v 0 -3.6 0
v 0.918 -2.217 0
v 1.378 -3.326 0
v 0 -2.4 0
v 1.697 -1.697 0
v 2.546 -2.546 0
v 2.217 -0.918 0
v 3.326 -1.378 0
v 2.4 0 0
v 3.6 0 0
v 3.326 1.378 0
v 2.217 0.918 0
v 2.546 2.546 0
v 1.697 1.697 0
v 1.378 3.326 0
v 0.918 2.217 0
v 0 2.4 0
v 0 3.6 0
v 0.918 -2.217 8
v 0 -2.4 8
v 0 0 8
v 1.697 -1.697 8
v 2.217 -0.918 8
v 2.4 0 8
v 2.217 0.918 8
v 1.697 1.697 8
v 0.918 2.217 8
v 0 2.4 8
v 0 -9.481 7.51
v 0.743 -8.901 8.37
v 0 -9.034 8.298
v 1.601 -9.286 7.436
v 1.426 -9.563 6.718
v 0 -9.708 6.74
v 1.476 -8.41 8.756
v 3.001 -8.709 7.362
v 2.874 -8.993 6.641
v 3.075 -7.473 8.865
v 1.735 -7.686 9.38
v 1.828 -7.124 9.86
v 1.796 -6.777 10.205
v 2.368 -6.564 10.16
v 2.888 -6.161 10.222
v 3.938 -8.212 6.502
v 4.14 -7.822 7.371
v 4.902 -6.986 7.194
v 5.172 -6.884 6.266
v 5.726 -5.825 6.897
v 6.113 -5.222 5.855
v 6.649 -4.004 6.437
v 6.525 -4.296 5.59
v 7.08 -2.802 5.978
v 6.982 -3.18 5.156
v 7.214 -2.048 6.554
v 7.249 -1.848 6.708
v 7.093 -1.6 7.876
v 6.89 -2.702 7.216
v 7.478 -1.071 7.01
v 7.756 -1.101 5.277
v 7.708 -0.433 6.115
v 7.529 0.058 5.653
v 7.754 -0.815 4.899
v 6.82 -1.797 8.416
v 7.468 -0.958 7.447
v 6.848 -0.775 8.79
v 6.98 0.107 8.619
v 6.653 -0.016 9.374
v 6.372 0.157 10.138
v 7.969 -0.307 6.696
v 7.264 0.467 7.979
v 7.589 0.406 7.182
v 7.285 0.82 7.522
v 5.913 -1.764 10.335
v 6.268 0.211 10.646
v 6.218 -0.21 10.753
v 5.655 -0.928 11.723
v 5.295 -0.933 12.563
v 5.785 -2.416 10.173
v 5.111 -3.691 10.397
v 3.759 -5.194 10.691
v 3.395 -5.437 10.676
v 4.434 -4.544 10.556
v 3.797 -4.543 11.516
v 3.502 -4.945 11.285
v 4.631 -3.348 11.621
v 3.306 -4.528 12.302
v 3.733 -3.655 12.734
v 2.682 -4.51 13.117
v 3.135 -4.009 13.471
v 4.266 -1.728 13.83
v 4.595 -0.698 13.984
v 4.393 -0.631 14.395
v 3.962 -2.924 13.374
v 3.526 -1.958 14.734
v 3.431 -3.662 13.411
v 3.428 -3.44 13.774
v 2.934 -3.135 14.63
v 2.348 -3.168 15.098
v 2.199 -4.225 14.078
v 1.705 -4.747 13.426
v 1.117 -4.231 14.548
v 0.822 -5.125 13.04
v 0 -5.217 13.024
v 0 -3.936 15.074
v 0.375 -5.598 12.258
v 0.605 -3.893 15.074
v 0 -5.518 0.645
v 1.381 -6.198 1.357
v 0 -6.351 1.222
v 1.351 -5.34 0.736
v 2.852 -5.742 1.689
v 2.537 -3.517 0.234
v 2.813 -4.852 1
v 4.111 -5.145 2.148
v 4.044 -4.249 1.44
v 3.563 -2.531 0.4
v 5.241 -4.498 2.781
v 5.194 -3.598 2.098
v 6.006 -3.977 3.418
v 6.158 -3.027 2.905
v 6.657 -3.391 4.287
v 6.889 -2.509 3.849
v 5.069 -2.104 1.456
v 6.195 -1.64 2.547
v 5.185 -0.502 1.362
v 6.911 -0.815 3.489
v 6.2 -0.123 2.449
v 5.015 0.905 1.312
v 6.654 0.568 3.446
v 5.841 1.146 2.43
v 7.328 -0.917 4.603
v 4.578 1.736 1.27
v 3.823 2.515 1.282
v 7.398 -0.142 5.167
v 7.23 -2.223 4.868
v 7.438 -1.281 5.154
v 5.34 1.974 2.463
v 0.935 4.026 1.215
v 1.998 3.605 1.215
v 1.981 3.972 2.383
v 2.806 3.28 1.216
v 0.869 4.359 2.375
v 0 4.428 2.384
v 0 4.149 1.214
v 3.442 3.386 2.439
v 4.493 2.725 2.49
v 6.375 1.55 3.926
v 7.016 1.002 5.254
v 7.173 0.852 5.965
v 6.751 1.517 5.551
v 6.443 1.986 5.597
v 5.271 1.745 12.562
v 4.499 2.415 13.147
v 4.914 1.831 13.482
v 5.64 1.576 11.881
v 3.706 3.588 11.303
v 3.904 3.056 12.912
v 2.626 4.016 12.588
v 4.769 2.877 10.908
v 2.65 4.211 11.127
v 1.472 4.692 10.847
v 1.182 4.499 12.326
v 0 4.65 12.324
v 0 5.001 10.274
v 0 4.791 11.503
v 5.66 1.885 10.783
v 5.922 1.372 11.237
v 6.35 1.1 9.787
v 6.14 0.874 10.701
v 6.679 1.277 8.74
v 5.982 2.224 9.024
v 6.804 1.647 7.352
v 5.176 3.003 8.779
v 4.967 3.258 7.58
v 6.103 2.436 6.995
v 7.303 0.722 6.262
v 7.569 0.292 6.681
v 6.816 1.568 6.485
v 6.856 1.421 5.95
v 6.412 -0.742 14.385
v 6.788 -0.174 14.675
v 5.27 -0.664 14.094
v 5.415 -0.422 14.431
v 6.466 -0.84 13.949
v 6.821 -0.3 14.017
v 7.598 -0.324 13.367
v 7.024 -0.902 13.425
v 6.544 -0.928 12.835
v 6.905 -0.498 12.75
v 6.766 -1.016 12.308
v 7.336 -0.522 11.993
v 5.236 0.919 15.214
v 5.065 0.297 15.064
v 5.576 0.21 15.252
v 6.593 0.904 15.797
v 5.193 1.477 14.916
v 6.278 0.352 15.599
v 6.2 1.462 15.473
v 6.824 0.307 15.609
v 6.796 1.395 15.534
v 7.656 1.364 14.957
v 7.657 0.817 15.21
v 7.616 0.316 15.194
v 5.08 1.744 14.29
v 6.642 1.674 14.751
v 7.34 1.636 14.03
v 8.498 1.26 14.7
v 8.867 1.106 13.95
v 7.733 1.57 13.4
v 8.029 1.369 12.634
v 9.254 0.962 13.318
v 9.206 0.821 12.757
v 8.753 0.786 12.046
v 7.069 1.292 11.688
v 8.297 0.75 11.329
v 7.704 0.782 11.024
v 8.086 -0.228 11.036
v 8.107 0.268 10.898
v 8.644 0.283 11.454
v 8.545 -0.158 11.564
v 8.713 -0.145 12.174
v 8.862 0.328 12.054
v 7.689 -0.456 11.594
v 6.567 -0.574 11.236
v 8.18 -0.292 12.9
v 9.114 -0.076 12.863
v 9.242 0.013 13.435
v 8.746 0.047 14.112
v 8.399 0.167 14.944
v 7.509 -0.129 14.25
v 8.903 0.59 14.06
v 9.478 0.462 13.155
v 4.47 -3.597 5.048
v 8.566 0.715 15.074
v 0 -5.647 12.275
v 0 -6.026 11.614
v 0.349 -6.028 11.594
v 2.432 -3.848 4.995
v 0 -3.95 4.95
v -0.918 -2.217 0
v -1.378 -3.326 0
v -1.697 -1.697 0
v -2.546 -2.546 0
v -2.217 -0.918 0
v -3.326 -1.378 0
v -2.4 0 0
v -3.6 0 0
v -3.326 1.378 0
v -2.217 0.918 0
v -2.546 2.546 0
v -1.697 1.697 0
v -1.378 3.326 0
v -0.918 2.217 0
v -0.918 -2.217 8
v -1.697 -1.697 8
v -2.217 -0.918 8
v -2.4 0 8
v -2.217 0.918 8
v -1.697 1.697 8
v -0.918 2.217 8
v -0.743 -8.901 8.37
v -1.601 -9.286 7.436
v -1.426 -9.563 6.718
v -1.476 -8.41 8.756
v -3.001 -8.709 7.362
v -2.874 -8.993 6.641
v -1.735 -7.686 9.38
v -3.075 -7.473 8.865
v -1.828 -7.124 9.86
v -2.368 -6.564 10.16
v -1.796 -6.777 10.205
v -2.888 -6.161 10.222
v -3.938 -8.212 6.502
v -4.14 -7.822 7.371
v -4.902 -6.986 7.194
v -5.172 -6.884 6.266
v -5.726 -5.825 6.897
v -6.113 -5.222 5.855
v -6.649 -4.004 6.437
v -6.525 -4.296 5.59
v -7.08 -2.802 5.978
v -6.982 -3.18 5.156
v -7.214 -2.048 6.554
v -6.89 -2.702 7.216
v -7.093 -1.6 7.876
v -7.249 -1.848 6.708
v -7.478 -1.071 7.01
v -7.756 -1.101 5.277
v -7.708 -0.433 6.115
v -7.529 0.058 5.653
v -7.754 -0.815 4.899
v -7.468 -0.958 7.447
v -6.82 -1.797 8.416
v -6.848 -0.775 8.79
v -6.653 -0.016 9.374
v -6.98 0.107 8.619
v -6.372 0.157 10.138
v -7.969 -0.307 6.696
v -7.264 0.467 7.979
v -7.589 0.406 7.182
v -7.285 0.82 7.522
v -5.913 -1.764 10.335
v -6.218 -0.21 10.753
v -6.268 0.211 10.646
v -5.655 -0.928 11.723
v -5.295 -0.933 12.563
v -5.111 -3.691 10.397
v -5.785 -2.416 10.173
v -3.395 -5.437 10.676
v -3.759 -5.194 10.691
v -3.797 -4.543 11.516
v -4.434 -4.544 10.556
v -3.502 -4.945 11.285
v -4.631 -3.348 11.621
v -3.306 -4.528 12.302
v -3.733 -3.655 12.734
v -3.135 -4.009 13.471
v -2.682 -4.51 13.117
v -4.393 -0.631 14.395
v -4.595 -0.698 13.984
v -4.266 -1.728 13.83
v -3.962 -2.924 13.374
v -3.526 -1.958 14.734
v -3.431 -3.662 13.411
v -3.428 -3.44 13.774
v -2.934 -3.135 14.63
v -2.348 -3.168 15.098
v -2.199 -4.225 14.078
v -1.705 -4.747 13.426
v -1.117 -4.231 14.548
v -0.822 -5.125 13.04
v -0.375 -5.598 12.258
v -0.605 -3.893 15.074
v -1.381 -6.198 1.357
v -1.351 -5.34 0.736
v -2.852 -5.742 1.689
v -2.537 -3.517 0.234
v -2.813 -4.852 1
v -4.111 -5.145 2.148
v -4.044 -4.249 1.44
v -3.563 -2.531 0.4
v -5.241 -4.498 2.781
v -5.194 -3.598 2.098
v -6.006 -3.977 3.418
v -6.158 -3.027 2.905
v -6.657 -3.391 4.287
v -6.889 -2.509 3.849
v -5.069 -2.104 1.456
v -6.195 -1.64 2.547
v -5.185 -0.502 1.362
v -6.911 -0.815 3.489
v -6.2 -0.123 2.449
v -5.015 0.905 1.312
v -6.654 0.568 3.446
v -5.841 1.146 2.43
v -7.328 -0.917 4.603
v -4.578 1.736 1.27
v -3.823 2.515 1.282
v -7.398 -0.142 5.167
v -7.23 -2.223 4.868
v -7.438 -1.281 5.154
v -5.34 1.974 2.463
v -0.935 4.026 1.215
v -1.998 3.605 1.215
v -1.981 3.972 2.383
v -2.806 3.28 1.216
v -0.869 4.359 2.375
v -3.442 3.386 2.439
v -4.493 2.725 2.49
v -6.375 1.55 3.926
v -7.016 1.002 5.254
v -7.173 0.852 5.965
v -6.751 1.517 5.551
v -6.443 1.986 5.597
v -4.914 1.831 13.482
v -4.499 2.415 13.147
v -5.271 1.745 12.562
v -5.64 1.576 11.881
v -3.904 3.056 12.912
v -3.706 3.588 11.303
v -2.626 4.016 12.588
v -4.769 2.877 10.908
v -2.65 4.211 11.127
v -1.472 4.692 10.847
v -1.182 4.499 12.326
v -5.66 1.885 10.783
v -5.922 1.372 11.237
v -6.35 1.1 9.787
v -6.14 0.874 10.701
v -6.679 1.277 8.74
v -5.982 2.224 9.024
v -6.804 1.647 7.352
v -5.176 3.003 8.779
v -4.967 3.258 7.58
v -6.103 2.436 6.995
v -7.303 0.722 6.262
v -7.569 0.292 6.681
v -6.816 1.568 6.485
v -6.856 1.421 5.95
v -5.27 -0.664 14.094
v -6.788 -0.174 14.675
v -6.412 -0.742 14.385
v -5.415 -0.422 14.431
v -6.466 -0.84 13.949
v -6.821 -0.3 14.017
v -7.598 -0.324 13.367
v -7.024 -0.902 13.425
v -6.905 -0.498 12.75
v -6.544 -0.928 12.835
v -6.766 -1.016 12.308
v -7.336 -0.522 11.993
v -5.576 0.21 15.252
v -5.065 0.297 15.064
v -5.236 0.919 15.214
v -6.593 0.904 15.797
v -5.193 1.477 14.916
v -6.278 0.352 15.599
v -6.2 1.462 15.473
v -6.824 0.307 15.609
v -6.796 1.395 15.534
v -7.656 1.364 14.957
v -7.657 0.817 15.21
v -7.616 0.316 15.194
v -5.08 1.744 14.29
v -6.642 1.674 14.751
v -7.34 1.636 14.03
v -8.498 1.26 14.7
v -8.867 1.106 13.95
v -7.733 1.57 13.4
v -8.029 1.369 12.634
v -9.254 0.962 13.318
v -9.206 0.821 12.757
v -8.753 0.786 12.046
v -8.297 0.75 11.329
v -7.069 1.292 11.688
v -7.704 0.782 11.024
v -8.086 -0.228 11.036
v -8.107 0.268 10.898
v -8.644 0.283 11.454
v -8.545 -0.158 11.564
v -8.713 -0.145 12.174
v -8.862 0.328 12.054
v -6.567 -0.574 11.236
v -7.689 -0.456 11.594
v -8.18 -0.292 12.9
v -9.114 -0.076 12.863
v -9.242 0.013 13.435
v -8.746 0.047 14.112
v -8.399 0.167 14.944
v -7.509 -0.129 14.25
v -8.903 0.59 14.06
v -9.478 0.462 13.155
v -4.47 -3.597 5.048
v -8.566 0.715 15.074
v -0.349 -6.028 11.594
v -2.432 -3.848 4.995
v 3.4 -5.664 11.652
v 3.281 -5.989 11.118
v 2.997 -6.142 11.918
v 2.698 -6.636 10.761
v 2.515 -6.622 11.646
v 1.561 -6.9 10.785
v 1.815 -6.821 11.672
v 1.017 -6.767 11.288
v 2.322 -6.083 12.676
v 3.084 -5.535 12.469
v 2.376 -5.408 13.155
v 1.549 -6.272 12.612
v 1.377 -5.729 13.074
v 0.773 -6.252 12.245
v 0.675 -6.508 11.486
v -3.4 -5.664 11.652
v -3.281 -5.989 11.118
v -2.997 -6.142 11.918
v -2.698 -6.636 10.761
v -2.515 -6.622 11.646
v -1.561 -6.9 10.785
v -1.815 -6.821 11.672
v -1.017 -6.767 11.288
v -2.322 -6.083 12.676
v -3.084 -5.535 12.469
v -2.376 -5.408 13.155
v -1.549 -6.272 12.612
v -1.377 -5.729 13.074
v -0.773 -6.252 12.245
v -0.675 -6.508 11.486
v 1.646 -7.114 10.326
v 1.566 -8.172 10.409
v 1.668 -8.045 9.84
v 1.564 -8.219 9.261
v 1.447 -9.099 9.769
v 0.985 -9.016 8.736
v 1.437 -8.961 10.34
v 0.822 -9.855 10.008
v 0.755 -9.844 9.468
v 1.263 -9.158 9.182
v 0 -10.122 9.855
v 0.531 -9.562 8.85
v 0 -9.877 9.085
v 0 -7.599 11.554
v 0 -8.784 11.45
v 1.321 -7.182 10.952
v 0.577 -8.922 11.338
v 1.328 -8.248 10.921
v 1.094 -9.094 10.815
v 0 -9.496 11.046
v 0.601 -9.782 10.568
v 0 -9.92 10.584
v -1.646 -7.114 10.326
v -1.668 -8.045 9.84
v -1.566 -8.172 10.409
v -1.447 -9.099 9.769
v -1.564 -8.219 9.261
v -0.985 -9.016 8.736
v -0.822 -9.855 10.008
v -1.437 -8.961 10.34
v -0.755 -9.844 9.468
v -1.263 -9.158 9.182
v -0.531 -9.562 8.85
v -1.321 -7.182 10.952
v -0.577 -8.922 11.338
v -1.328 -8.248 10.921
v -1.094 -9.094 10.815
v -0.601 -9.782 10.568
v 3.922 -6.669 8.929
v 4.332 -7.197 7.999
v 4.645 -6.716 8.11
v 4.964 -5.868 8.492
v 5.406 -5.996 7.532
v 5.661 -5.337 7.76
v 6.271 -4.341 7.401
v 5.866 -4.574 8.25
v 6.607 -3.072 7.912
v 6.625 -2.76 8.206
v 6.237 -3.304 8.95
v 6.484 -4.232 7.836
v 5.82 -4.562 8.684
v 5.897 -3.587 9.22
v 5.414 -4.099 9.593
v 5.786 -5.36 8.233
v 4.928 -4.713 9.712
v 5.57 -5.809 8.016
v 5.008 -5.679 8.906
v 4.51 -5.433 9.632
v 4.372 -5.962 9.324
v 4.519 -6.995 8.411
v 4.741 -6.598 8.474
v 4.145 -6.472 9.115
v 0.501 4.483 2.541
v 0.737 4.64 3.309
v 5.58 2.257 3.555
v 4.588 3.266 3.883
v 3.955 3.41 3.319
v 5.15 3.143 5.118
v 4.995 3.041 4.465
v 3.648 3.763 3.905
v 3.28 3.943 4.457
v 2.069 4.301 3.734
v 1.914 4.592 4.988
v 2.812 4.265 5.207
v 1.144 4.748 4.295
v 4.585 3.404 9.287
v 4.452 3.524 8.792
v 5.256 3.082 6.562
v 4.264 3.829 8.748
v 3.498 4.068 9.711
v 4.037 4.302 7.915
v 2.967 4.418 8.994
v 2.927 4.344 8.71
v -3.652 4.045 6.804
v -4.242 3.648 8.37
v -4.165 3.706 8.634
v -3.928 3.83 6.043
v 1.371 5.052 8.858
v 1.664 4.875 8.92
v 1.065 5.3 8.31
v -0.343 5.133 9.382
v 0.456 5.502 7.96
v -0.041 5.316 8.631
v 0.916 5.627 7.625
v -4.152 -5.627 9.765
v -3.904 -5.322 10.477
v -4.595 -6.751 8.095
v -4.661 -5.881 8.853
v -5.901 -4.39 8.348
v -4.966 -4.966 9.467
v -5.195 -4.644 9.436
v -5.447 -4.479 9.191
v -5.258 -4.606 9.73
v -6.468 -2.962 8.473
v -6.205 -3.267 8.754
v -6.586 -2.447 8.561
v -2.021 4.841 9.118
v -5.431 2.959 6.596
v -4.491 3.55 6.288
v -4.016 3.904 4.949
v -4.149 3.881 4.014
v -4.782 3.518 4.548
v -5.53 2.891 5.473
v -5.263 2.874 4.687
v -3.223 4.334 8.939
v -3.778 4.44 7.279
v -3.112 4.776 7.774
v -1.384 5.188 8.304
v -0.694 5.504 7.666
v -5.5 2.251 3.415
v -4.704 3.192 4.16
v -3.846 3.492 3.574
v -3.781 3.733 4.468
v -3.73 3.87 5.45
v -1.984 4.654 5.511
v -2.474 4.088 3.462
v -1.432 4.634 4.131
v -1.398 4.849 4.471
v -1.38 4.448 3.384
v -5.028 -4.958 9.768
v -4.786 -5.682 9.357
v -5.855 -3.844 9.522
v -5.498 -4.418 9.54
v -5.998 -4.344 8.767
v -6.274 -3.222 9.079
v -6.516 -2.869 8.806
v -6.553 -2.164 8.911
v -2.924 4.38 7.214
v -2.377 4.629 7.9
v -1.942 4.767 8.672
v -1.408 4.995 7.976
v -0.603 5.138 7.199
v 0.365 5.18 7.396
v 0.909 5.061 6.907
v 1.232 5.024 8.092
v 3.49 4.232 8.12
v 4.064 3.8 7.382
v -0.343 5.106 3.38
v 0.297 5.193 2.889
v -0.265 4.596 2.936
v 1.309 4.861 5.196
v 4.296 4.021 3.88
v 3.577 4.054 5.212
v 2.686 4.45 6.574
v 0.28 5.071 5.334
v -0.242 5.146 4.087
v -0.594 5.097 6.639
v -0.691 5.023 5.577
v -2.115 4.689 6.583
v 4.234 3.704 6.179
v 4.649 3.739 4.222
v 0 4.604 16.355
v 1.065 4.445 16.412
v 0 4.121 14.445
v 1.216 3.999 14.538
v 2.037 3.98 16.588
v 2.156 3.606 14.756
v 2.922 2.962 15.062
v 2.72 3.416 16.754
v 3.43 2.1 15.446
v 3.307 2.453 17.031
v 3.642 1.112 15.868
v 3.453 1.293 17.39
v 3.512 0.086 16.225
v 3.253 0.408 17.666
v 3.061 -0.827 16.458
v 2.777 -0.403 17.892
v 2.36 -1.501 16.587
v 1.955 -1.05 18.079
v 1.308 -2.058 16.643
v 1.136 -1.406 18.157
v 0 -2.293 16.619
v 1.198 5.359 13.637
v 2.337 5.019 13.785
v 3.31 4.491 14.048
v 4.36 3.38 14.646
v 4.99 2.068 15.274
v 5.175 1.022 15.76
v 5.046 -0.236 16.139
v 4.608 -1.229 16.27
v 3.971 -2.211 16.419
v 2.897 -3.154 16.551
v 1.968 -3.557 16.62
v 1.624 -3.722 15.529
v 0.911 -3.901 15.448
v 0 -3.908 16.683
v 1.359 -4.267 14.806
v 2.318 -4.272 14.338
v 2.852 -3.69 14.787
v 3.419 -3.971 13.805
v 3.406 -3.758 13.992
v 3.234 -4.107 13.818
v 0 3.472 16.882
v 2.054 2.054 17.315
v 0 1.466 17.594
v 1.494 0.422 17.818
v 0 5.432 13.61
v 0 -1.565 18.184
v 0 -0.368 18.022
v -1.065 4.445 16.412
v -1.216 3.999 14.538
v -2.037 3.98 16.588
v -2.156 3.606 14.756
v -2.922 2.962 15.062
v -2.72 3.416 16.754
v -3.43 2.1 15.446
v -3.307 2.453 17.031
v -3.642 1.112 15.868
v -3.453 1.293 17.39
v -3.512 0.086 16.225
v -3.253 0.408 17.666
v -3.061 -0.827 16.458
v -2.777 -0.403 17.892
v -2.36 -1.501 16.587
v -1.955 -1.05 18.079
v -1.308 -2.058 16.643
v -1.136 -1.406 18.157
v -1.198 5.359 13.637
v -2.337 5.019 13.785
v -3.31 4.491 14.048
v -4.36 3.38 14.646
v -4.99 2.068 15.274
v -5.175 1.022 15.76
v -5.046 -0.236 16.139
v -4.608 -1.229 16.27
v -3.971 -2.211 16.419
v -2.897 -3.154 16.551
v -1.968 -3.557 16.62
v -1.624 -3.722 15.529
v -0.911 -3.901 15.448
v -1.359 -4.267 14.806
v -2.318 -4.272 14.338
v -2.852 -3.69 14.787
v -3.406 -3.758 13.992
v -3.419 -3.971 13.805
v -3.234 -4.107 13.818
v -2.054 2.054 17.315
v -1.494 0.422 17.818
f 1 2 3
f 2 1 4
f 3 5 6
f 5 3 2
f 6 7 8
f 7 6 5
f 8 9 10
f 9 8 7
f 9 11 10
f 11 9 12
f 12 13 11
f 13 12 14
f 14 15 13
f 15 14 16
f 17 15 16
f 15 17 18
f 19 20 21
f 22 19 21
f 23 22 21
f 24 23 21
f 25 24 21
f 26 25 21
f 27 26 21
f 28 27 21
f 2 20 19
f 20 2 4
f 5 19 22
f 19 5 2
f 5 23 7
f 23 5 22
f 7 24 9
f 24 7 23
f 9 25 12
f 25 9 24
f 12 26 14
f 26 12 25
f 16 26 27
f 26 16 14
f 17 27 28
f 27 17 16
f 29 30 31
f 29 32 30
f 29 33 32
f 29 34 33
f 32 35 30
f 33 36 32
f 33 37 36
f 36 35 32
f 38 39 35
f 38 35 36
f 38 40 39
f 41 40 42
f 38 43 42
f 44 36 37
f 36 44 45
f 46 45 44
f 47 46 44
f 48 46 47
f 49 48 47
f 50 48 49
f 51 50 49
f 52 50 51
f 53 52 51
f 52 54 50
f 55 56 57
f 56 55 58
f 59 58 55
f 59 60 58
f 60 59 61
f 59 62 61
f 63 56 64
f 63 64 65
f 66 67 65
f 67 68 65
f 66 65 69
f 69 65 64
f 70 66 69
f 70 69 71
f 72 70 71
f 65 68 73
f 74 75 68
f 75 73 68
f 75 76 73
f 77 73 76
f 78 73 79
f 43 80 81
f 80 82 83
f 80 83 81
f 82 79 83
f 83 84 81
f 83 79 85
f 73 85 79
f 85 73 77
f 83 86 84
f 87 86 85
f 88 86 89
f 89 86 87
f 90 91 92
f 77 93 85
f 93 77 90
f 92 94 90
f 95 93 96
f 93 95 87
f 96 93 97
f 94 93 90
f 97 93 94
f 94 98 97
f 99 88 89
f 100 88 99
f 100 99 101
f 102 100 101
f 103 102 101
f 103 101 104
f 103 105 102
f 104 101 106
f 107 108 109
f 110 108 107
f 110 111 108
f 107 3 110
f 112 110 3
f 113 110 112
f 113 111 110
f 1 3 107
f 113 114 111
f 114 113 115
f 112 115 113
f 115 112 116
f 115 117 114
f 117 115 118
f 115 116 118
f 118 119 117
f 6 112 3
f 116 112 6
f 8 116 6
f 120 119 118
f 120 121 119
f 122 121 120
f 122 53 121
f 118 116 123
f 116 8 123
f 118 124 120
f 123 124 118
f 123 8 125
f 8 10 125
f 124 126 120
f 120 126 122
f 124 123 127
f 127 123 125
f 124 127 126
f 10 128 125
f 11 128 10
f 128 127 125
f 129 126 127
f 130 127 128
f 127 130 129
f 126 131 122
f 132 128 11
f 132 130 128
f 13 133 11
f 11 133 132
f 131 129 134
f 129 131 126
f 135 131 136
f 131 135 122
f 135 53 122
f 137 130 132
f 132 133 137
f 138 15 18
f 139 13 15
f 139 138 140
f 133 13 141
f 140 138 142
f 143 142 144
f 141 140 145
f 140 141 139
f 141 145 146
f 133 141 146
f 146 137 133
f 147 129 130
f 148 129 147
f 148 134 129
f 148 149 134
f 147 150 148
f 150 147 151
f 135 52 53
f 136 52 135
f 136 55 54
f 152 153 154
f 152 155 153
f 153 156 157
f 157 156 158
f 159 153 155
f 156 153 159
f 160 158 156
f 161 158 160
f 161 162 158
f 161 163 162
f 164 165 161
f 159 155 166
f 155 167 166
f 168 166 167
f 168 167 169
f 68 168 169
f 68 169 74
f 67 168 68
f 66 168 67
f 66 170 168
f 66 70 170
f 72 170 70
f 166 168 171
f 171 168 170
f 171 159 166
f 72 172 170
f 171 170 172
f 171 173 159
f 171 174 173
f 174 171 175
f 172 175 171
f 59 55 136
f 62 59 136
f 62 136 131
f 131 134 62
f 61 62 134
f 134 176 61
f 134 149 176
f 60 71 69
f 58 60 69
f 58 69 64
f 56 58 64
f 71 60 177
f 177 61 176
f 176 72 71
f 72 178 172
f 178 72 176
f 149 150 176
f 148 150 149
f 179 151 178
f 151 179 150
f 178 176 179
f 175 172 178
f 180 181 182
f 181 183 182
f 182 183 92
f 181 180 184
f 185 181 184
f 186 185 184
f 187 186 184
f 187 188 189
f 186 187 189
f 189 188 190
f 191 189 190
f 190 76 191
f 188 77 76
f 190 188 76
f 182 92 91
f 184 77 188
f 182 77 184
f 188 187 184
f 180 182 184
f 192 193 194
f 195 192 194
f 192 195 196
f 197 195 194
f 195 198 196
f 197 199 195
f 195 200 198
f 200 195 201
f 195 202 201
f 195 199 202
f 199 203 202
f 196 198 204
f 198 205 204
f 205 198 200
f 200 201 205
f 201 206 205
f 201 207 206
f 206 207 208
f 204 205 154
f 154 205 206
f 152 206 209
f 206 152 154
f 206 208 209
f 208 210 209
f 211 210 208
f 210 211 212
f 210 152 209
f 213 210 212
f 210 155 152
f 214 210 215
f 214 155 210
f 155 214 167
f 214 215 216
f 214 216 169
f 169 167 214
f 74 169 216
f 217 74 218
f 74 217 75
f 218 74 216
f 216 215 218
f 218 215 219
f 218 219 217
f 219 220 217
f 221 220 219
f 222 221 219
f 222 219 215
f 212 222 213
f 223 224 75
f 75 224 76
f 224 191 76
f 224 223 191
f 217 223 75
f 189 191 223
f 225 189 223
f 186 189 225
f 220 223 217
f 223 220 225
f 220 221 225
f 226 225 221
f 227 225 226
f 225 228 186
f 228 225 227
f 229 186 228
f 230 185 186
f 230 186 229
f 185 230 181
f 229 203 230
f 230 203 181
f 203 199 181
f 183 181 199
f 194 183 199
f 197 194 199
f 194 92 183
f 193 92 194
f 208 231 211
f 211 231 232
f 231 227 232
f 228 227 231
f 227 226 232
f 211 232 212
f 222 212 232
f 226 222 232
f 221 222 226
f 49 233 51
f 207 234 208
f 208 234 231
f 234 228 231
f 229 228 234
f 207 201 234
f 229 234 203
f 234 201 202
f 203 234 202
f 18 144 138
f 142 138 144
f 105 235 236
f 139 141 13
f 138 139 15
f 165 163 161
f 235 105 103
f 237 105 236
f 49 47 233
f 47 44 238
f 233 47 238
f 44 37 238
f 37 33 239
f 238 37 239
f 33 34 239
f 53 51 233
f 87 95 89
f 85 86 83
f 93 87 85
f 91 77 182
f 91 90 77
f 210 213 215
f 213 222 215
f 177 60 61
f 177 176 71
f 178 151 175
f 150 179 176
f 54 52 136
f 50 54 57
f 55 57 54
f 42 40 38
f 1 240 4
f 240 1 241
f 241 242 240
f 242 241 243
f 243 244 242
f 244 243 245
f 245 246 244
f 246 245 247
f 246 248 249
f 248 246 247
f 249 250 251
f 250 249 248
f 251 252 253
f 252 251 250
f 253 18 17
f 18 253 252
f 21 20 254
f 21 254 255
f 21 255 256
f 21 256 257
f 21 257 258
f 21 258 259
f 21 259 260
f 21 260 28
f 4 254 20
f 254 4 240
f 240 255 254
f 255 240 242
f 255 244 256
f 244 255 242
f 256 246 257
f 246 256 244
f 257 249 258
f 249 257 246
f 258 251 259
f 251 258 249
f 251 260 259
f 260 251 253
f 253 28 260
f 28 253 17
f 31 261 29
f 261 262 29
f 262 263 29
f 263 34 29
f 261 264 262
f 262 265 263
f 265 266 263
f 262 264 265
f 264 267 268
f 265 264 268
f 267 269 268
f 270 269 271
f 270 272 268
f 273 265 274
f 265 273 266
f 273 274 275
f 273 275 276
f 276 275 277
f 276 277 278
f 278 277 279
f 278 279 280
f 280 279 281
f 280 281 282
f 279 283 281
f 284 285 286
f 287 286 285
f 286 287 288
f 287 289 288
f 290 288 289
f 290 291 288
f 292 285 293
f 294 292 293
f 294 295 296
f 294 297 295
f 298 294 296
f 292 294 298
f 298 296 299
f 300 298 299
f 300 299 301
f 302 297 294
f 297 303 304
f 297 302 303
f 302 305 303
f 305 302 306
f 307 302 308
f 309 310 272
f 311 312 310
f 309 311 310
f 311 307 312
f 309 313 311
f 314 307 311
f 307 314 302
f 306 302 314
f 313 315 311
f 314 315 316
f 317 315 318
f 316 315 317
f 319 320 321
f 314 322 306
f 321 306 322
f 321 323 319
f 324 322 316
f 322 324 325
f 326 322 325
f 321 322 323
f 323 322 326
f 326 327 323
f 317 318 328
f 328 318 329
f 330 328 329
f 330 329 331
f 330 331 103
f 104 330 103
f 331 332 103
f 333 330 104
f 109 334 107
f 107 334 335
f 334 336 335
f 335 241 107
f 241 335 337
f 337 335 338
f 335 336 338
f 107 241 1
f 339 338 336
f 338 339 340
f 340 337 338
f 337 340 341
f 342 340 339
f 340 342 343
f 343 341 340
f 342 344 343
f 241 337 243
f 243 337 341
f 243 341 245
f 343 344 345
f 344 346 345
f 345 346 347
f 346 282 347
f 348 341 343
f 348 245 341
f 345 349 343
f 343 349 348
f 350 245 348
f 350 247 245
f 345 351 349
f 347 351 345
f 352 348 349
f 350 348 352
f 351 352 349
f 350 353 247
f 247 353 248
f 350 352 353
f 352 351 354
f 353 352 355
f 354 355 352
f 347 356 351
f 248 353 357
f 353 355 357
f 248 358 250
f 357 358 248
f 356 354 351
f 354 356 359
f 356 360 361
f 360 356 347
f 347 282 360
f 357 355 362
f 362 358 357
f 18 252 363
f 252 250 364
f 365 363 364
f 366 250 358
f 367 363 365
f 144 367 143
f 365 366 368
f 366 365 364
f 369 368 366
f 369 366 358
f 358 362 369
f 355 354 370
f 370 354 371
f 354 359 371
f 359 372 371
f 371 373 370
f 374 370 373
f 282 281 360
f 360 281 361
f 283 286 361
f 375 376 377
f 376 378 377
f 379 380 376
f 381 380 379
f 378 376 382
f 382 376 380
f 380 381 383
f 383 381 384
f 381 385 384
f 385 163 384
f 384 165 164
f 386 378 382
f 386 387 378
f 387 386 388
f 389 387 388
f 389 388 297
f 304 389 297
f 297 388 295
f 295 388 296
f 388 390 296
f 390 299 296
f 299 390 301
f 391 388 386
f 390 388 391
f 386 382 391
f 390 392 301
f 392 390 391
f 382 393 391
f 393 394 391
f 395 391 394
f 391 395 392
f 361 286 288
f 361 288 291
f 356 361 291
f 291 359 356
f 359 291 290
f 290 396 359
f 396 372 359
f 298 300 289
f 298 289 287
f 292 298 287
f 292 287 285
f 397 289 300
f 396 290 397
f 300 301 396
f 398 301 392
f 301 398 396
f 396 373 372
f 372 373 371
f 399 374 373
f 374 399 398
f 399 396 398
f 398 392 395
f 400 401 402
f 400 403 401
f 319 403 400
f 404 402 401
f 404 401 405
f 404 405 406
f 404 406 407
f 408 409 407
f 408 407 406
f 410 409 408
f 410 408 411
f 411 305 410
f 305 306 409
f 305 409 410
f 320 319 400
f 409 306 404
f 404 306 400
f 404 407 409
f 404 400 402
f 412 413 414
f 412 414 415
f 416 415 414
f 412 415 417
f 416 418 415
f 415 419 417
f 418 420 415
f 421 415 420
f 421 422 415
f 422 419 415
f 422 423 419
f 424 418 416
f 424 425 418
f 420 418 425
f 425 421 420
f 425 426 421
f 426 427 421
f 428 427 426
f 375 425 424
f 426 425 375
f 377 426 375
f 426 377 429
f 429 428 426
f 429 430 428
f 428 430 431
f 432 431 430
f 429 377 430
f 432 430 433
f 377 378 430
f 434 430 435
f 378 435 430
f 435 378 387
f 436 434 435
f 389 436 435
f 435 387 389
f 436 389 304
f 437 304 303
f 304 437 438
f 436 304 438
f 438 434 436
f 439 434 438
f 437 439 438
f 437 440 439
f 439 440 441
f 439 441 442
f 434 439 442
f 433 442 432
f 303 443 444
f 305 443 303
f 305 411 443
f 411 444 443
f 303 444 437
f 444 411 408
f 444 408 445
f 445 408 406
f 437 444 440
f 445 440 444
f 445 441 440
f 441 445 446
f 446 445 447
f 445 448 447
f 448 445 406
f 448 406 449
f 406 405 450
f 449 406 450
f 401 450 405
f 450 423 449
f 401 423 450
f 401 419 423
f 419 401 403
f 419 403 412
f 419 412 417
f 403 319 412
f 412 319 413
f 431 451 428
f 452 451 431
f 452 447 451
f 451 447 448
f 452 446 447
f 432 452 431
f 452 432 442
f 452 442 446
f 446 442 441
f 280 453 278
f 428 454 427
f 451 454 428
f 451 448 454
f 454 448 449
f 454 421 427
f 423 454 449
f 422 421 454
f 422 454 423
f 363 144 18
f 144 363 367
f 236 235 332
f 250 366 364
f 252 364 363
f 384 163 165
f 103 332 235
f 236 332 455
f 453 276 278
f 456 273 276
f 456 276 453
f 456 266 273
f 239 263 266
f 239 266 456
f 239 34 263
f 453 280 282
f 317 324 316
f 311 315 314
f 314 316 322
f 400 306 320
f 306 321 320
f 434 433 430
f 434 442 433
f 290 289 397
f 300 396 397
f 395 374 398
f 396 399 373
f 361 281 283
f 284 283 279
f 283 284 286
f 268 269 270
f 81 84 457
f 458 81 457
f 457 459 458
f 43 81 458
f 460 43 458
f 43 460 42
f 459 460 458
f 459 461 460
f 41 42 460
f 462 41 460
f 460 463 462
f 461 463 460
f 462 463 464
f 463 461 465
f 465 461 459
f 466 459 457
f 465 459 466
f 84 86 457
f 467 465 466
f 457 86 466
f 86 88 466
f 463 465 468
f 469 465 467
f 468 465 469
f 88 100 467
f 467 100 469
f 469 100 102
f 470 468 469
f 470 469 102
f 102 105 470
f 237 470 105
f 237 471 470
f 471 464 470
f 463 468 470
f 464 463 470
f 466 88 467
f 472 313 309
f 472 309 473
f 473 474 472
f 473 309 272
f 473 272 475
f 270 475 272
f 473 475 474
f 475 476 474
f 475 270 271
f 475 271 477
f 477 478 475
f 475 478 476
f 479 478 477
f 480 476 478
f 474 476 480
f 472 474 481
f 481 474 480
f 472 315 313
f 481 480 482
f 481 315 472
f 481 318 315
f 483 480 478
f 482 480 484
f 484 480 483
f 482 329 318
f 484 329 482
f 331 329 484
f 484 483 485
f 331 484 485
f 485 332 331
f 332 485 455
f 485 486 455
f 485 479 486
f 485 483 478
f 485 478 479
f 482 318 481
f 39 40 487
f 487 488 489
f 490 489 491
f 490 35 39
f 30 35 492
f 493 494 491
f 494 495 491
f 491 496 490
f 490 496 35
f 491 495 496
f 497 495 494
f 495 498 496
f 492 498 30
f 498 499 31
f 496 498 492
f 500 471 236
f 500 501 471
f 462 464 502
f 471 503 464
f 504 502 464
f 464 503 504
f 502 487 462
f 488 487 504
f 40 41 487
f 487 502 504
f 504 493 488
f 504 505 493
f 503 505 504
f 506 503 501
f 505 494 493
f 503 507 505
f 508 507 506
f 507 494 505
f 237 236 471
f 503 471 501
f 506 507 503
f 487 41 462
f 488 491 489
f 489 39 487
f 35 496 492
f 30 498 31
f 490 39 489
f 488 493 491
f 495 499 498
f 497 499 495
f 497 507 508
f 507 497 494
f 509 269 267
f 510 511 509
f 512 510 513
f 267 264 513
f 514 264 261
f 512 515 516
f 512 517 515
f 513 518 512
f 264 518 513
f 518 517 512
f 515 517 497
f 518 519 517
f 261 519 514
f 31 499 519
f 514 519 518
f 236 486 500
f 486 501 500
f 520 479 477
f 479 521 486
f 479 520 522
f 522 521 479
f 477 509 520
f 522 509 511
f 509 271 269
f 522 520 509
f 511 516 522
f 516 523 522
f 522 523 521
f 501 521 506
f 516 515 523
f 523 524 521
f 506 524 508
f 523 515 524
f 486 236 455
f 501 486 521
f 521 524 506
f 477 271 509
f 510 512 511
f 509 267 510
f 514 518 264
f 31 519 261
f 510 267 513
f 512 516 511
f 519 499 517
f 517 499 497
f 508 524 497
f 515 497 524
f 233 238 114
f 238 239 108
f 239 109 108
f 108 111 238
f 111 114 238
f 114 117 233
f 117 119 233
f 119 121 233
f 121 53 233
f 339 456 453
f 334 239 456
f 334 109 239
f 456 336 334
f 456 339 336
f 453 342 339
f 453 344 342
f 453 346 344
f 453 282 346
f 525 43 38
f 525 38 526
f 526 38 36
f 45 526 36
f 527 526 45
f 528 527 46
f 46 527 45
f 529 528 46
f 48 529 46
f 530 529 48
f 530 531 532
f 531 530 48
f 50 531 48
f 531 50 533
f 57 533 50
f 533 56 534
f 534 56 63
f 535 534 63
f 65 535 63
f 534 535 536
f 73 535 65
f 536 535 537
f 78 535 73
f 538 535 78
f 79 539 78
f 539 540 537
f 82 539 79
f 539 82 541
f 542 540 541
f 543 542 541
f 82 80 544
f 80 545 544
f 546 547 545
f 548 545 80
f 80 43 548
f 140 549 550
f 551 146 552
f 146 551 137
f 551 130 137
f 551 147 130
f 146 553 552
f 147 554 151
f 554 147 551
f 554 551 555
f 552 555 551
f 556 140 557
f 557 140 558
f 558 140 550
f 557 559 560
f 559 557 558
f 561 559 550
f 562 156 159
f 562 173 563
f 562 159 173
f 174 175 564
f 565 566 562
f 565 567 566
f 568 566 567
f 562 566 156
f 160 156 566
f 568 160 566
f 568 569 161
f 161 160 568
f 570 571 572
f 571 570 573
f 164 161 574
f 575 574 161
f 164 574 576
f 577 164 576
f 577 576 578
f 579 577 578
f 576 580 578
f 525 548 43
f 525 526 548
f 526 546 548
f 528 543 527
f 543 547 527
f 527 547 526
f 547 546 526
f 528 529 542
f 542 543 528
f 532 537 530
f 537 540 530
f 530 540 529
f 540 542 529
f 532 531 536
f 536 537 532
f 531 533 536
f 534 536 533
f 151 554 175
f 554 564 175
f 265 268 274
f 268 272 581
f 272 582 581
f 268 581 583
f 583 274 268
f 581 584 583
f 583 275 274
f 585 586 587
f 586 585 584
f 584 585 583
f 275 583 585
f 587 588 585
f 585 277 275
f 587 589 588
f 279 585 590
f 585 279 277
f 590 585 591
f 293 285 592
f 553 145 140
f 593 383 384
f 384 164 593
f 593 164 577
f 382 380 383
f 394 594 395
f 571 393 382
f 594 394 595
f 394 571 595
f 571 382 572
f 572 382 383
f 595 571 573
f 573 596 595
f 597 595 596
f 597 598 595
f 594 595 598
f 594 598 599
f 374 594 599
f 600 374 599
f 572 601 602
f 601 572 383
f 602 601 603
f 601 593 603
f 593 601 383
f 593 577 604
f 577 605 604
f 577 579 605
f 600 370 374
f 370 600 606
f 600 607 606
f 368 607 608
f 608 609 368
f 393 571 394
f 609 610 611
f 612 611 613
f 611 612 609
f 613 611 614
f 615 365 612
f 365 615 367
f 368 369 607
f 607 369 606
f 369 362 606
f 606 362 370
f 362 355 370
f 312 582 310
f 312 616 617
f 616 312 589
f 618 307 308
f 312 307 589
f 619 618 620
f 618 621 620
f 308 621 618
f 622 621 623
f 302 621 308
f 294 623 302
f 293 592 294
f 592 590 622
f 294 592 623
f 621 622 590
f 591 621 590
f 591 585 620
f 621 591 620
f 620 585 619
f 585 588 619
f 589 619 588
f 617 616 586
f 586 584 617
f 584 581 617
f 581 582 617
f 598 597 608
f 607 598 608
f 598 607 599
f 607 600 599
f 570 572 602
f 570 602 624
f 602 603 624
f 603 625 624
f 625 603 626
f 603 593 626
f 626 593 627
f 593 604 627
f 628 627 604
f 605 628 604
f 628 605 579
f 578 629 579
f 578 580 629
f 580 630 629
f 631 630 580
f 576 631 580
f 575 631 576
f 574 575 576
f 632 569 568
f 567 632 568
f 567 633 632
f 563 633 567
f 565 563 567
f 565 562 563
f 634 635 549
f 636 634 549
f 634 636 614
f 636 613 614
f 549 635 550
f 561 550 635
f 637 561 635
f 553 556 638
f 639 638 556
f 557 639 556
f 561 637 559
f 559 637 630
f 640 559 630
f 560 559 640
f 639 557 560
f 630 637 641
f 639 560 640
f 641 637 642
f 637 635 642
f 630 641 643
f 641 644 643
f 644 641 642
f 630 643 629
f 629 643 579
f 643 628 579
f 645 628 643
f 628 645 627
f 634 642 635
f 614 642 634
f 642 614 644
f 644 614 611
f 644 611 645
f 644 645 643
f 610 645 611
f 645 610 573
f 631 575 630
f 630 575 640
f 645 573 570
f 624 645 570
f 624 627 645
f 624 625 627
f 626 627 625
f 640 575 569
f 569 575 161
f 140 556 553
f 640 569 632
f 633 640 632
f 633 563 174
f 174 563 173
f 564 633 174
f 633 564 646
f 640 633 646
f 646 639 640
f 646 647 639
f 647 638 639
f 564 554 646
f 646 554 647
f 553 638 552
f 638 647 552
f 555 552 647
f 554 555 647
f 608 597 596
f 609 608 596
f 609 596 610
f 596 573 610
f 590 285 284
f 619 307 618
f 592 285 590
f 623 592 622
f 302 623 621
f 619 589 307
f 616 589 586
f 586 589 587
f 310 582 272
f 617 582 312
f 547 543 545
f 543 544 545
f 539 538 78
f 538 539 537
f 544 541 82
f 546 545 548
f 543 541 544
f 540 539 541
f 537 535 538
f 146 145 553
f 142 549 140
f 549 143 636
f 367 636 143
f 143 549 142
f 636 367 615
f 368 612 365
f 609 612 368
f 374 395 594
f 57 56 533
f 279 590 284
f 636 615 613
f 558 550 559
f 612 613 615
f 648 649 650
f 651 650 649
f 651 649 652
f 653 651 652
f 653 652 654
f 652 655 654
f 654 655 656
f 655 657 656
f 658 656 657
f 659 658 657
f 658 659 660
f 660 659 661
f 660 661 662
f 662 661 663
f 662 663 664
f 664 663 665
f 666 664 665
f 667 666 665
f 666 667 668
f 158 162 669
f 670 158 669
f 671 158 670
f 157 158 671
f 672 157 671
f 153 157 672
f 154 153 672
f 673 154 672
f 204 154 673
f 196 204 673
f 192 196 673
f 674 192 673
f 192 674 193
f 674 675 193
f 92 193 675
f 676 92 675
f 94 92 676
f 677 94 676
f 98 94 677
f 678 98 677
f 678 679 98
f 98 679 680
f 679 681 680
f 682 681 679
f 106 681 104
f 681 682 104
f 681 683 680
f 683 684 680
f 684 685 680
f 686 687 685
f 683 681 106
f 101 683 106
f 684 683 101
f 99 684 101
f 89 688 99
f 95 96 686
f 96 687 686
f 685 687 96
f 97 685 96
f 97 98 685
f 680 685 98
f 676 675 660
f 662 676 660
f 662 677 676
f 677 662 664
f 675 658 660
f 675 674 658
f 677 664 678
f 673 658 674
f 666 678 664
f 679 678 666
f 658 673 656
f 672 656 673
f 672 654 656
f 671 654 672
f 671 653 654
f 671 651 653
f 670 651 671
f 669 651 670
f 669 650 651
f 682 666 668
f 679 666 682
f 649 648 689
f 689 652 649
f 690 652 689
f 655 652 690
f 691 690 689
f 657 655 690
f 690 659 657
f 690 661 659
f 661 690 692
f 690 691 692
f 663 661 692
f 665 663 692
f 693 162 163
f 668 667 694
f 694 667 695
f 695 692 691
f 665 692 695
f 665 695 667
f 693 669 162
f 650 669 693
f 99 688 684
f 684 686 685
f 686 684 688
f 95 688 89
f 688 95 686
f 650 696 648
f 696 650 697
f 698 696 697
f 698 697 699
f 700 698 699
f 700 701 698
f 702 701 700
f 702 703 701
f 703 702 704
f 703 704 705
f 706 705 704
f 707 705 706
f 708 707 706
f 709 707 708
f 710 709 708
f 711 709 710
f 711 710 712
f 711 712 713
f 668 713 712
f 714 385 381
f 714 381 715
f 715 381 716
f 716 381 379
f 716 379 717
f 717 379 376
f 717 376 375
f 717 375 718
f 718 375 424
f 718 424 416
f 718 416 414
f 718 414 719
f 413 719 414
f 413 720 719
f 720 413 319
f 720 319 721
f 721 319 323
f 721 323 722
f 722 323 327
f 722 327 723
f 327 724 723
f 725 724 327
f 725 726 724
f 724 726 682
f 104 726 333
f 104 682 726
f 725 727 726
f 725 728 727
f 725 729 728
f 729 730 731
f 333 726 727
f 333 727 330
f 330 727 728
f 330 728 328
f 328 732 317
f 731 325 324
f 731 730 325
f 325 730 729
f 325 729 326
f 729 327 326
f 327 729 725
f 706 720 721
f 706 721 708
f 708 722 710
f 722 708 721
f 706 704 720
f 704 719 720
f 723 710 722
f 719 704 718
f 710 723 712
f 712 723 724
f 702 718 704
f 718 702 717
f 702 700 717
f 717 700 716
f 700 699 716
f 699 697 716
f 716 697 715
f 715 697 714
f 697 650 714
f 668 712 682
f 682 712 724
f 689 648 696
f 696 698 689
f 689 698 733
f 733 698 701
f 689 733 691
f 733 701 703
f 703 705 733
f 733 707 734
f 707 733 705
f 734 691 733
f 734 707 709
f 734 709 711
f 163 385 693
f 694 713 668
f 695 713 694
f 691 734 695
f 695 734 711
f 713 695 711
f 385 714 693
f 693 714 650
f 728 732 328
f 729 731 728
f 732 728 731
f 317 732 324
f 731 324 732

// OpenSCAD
use <../lib.scad>
use <s/89646s01.scad>
use <s/89646s02.scad>
use <s/89646s03.scad>
use <s/89646s04.scad>
use <s/89646s05.scad>
use <s/89646s06.scad>
function ldraw_lib__89646() = [
// 0 Minifig Head Muppet Bear
// 0 Name: 89646.dat
// 0 Author: Fredrik Hareide [fhareide]
// 0 !LDRAW_ORG Part UPDATE 2024-08
// 0 !LICENSE Licensed under CC BY 4.0 : see CAreadme.txt
// 
// 0 BFC CERTIFY CCW
  [0,"BFC","CERTIFY"],
  [0,"BFC","CCW"],
// 
// 0 !HISTORY 2024-01-12 {LEGO Instructions App} Original part shape
// 0 !HISTORY 2024-01-12 [fhareide] File preparation for LDraw Parts Tracker
// 0 !HISTORY 2024-09-30 [OrionP] Official Update 2024-08
// 
// 1 16 0 0 0 1 0 0 0 1 0 0 0 1 s\89646s01.dat
  [1,16,0,0,0,1,0,0,0,1,0,0,0,1, ldraw_lib__s__89646s01()],
// 1 16 0 0 0 -1 0 0 0 1 0 0 0 1 s\89646s01.dat
  [1,16,0,0,0,-1,0,0,0,1,0,0,0,1, ldraw_lib__s__89646s01()],
// 
// 1 16 0 0 0 1 0 0 0 1 0 0 0 1 s\89646s02.dat
  [1,16,0,0,0,1,0,0,0,1,0,0,0,1, ldraw_lib__s__89646s02()],
// 1 16 0 0 0 -1 0 0 0 1 0 0 0 1 s\89646s02.dat
  [1,16,0,0,0,-1,0,0,0,1,0,0,0,1, ldraw_lib__s__89646s02()],
// 
// 1 16 0 0 0 1 0 0 0 1 0 0 0 1 s\89646s03.dat
  [1,16,0,0,0,1,0,0,0,1,0,0,0,1, ldraw_lib__s__89646s03()],
// 1 16 0 0 0 -1 0 0 0 1 0 0 0 1 s\89646s03.dat
  [1,16,0,0,0,-1,0,0,0,1,0,0,0,1, ldraw_lib__s__89646s03()],
// 
// 1 16 0 0 0 1 0 0 0 1 0 0 0 1 s\89646s04.dat
  [1,16,0,0,0,1,0,0,0,1,0,0,0,1, ldraw_lib__s__89646s04()],
// 1 16 0 0 0 -1 0 0 0 1 0 0 0 1 s\89646s04.dat
  [1,16,0,0,0,-1,0,0,0,1,0,0,0,1, ldraw_lib__s__89646s04()],
// 
// 1 16 0 0 0 1 0 0 0 1 0 0 0 1 s\89646s05.dat
  [1,16,0,0,0,1,0,0,0,1,0,0,0,1, ldraw_lib__s__89646s05()],
// 
// 1 16 0 0 0 1 0 0 0 1 0 0 0 1 s\89646s06.dat
  [1,16,0,0,0,1,0,0,0,1,0,0,0,1, ldraw_lib__s__89646s06()],
// 1 16 0 0 0 -1 0 0 0 1 0 0 0 1 s\89646s06.dat
  [1,16,0,0,0,-1,0,0,0,1,0,0,0,1, ldraw_lib__s__89646s06()],
];
module ldraw_lib__89646(step=0, col=false, unit=2/5, alt=false, line=0.2, solid=!$preview)
    makepoly(ldraw_lib__89646(), step=step, col=col, unit=unit, alt=alt, line=line, solid=solid);
ldraw_lib__89646(line=0.2);
